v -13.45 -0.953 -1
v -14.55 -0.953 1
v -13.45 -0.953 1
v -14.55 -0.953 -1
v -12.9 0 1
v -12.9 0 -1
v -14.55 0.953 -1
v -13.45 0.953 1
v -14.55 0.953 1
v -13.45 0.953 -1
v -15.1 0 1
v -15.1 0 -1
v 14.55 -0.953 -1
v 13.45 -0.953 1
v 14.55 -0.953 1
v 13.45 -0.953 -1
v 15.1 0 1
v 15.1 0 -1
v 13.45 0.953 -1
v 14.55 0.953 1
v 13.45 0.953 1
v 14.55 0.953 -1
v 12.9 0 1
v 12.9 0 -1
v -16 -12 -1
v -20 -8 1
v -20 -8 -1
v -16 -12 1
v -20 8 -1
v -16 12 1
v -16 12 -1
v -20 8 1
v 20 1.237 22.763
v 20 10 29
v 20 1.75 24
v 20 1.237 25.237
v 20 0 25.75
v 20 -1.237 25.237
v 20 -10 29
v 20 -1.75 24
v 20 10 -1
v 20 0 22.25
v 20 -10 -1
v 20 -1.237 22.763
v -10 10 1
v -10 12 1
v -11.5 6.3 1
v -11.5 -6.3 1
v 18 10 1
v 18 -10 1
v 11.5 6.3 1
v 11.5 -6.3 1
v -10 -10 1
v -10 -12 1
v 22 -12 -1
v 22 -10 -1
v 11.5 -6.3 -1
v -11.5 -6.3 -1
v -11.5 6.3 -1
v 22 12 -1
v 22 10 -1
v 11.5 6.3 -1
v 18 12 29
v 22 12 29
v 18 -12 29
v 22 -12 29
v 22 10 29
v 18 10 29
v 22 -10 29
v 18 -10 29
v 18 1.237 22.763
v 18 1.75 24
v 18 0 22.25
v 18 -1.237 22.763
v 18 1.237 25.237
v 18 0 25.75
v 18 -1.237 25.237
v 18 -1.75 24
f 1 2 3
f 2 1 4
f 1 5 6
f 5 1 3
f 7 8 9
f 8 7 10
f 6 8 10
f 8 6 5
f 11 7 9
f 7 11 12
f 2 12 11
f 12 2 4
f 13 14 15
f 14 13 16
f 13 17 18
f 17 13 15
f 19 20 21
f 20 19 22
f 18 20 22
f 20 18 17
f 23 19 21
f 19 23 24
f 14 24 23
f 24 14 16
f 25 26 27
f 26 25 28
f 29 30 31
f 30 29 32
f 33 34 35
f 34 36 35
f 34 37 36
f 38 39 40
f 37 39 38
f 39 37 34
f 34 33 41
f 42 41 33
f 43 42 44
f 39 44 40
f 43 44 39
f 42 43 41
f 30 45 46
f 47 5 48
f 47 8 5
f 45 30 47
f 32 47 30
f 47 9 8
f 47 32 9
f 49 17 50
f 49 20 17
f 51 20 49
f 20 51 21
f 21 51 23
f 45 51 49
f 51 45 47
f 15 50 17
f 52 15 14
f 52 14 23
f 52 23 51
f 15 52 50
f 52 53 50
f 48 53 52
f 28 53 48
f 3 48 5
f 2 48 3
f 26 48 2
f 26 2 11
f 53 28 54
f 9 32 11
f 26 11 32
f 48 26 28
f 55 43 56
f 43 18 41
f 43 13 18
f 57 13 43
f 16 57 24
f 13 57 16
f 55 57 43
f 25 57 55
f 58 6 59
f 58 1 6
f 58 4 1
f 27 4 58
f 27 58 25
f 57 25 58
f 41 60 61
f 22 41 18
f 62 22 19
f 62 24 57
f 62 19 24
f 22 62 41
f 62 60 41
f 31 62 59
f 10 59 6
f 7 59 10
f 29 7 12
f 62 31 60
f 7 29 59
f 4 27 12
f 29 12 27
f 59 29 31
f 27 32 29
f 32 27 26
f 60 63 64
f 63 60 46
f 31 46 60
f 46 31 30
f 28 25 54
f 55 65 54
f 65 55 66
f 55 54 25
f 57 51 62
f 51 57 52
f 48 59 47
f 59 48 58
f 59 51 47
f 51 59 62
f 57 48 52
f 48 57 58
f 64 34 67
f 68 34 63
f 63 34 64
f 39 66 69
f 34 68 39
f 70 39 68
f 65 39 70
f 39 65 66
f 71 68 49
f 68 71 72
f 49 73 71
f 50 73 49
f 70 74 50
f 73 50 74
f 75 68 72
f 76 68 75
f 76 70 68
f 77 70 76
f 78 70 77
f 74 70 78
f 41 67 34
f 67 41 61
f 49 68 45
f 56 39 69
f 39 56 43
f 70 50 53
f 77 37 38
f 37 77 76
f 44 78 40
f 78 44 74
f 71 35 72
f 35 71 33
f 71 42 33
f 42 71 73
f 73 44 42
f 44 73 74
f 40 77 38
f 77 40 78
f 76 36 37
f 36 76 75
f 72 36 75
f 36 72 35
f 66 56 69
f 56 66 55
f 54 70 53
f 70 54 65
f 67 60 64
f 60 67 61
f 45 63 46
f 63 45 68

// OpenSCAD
// bottom
difference() {
    cube([40,24,2],center=true);
    cube([23.0,12.6,2.2],center=true);
    translate([0,0,0]){
        cube([22.8,12.4,2.2],center=true);
    }
    for(x=[-14,14]){
        translate([x,0,0]){
            rotate([0,0,0]){
                cylinder(d=2.2,h=60,center=true,$fn=6);
            }
        }
    }
    for(y=[-12,12]){
        translate([-20,y,0]){
            cylinder(h=2.2,d=8,$fn=4,center=true);
        }
    }
}

// side
difference() {
    translate([19,0,14]) {
        cube([2,20,30],center=true);
    }
    translate([0,0,24]){
        rotate([0,90,0]){
            cylinder(d=3.5,h=60,center=true,$fn=8);
        }
    }  
}

// trangle
for (y=[-11,11]) {
    difference() {
        translate([0,y,14]){
            cube([44,2,30], center=true);
        }
        translate([-21,0,29]){
            rotate([90,0,0]){
                cylinder(r=39,h=60,center=true,$fn=4);
            }
        }
    }
}
